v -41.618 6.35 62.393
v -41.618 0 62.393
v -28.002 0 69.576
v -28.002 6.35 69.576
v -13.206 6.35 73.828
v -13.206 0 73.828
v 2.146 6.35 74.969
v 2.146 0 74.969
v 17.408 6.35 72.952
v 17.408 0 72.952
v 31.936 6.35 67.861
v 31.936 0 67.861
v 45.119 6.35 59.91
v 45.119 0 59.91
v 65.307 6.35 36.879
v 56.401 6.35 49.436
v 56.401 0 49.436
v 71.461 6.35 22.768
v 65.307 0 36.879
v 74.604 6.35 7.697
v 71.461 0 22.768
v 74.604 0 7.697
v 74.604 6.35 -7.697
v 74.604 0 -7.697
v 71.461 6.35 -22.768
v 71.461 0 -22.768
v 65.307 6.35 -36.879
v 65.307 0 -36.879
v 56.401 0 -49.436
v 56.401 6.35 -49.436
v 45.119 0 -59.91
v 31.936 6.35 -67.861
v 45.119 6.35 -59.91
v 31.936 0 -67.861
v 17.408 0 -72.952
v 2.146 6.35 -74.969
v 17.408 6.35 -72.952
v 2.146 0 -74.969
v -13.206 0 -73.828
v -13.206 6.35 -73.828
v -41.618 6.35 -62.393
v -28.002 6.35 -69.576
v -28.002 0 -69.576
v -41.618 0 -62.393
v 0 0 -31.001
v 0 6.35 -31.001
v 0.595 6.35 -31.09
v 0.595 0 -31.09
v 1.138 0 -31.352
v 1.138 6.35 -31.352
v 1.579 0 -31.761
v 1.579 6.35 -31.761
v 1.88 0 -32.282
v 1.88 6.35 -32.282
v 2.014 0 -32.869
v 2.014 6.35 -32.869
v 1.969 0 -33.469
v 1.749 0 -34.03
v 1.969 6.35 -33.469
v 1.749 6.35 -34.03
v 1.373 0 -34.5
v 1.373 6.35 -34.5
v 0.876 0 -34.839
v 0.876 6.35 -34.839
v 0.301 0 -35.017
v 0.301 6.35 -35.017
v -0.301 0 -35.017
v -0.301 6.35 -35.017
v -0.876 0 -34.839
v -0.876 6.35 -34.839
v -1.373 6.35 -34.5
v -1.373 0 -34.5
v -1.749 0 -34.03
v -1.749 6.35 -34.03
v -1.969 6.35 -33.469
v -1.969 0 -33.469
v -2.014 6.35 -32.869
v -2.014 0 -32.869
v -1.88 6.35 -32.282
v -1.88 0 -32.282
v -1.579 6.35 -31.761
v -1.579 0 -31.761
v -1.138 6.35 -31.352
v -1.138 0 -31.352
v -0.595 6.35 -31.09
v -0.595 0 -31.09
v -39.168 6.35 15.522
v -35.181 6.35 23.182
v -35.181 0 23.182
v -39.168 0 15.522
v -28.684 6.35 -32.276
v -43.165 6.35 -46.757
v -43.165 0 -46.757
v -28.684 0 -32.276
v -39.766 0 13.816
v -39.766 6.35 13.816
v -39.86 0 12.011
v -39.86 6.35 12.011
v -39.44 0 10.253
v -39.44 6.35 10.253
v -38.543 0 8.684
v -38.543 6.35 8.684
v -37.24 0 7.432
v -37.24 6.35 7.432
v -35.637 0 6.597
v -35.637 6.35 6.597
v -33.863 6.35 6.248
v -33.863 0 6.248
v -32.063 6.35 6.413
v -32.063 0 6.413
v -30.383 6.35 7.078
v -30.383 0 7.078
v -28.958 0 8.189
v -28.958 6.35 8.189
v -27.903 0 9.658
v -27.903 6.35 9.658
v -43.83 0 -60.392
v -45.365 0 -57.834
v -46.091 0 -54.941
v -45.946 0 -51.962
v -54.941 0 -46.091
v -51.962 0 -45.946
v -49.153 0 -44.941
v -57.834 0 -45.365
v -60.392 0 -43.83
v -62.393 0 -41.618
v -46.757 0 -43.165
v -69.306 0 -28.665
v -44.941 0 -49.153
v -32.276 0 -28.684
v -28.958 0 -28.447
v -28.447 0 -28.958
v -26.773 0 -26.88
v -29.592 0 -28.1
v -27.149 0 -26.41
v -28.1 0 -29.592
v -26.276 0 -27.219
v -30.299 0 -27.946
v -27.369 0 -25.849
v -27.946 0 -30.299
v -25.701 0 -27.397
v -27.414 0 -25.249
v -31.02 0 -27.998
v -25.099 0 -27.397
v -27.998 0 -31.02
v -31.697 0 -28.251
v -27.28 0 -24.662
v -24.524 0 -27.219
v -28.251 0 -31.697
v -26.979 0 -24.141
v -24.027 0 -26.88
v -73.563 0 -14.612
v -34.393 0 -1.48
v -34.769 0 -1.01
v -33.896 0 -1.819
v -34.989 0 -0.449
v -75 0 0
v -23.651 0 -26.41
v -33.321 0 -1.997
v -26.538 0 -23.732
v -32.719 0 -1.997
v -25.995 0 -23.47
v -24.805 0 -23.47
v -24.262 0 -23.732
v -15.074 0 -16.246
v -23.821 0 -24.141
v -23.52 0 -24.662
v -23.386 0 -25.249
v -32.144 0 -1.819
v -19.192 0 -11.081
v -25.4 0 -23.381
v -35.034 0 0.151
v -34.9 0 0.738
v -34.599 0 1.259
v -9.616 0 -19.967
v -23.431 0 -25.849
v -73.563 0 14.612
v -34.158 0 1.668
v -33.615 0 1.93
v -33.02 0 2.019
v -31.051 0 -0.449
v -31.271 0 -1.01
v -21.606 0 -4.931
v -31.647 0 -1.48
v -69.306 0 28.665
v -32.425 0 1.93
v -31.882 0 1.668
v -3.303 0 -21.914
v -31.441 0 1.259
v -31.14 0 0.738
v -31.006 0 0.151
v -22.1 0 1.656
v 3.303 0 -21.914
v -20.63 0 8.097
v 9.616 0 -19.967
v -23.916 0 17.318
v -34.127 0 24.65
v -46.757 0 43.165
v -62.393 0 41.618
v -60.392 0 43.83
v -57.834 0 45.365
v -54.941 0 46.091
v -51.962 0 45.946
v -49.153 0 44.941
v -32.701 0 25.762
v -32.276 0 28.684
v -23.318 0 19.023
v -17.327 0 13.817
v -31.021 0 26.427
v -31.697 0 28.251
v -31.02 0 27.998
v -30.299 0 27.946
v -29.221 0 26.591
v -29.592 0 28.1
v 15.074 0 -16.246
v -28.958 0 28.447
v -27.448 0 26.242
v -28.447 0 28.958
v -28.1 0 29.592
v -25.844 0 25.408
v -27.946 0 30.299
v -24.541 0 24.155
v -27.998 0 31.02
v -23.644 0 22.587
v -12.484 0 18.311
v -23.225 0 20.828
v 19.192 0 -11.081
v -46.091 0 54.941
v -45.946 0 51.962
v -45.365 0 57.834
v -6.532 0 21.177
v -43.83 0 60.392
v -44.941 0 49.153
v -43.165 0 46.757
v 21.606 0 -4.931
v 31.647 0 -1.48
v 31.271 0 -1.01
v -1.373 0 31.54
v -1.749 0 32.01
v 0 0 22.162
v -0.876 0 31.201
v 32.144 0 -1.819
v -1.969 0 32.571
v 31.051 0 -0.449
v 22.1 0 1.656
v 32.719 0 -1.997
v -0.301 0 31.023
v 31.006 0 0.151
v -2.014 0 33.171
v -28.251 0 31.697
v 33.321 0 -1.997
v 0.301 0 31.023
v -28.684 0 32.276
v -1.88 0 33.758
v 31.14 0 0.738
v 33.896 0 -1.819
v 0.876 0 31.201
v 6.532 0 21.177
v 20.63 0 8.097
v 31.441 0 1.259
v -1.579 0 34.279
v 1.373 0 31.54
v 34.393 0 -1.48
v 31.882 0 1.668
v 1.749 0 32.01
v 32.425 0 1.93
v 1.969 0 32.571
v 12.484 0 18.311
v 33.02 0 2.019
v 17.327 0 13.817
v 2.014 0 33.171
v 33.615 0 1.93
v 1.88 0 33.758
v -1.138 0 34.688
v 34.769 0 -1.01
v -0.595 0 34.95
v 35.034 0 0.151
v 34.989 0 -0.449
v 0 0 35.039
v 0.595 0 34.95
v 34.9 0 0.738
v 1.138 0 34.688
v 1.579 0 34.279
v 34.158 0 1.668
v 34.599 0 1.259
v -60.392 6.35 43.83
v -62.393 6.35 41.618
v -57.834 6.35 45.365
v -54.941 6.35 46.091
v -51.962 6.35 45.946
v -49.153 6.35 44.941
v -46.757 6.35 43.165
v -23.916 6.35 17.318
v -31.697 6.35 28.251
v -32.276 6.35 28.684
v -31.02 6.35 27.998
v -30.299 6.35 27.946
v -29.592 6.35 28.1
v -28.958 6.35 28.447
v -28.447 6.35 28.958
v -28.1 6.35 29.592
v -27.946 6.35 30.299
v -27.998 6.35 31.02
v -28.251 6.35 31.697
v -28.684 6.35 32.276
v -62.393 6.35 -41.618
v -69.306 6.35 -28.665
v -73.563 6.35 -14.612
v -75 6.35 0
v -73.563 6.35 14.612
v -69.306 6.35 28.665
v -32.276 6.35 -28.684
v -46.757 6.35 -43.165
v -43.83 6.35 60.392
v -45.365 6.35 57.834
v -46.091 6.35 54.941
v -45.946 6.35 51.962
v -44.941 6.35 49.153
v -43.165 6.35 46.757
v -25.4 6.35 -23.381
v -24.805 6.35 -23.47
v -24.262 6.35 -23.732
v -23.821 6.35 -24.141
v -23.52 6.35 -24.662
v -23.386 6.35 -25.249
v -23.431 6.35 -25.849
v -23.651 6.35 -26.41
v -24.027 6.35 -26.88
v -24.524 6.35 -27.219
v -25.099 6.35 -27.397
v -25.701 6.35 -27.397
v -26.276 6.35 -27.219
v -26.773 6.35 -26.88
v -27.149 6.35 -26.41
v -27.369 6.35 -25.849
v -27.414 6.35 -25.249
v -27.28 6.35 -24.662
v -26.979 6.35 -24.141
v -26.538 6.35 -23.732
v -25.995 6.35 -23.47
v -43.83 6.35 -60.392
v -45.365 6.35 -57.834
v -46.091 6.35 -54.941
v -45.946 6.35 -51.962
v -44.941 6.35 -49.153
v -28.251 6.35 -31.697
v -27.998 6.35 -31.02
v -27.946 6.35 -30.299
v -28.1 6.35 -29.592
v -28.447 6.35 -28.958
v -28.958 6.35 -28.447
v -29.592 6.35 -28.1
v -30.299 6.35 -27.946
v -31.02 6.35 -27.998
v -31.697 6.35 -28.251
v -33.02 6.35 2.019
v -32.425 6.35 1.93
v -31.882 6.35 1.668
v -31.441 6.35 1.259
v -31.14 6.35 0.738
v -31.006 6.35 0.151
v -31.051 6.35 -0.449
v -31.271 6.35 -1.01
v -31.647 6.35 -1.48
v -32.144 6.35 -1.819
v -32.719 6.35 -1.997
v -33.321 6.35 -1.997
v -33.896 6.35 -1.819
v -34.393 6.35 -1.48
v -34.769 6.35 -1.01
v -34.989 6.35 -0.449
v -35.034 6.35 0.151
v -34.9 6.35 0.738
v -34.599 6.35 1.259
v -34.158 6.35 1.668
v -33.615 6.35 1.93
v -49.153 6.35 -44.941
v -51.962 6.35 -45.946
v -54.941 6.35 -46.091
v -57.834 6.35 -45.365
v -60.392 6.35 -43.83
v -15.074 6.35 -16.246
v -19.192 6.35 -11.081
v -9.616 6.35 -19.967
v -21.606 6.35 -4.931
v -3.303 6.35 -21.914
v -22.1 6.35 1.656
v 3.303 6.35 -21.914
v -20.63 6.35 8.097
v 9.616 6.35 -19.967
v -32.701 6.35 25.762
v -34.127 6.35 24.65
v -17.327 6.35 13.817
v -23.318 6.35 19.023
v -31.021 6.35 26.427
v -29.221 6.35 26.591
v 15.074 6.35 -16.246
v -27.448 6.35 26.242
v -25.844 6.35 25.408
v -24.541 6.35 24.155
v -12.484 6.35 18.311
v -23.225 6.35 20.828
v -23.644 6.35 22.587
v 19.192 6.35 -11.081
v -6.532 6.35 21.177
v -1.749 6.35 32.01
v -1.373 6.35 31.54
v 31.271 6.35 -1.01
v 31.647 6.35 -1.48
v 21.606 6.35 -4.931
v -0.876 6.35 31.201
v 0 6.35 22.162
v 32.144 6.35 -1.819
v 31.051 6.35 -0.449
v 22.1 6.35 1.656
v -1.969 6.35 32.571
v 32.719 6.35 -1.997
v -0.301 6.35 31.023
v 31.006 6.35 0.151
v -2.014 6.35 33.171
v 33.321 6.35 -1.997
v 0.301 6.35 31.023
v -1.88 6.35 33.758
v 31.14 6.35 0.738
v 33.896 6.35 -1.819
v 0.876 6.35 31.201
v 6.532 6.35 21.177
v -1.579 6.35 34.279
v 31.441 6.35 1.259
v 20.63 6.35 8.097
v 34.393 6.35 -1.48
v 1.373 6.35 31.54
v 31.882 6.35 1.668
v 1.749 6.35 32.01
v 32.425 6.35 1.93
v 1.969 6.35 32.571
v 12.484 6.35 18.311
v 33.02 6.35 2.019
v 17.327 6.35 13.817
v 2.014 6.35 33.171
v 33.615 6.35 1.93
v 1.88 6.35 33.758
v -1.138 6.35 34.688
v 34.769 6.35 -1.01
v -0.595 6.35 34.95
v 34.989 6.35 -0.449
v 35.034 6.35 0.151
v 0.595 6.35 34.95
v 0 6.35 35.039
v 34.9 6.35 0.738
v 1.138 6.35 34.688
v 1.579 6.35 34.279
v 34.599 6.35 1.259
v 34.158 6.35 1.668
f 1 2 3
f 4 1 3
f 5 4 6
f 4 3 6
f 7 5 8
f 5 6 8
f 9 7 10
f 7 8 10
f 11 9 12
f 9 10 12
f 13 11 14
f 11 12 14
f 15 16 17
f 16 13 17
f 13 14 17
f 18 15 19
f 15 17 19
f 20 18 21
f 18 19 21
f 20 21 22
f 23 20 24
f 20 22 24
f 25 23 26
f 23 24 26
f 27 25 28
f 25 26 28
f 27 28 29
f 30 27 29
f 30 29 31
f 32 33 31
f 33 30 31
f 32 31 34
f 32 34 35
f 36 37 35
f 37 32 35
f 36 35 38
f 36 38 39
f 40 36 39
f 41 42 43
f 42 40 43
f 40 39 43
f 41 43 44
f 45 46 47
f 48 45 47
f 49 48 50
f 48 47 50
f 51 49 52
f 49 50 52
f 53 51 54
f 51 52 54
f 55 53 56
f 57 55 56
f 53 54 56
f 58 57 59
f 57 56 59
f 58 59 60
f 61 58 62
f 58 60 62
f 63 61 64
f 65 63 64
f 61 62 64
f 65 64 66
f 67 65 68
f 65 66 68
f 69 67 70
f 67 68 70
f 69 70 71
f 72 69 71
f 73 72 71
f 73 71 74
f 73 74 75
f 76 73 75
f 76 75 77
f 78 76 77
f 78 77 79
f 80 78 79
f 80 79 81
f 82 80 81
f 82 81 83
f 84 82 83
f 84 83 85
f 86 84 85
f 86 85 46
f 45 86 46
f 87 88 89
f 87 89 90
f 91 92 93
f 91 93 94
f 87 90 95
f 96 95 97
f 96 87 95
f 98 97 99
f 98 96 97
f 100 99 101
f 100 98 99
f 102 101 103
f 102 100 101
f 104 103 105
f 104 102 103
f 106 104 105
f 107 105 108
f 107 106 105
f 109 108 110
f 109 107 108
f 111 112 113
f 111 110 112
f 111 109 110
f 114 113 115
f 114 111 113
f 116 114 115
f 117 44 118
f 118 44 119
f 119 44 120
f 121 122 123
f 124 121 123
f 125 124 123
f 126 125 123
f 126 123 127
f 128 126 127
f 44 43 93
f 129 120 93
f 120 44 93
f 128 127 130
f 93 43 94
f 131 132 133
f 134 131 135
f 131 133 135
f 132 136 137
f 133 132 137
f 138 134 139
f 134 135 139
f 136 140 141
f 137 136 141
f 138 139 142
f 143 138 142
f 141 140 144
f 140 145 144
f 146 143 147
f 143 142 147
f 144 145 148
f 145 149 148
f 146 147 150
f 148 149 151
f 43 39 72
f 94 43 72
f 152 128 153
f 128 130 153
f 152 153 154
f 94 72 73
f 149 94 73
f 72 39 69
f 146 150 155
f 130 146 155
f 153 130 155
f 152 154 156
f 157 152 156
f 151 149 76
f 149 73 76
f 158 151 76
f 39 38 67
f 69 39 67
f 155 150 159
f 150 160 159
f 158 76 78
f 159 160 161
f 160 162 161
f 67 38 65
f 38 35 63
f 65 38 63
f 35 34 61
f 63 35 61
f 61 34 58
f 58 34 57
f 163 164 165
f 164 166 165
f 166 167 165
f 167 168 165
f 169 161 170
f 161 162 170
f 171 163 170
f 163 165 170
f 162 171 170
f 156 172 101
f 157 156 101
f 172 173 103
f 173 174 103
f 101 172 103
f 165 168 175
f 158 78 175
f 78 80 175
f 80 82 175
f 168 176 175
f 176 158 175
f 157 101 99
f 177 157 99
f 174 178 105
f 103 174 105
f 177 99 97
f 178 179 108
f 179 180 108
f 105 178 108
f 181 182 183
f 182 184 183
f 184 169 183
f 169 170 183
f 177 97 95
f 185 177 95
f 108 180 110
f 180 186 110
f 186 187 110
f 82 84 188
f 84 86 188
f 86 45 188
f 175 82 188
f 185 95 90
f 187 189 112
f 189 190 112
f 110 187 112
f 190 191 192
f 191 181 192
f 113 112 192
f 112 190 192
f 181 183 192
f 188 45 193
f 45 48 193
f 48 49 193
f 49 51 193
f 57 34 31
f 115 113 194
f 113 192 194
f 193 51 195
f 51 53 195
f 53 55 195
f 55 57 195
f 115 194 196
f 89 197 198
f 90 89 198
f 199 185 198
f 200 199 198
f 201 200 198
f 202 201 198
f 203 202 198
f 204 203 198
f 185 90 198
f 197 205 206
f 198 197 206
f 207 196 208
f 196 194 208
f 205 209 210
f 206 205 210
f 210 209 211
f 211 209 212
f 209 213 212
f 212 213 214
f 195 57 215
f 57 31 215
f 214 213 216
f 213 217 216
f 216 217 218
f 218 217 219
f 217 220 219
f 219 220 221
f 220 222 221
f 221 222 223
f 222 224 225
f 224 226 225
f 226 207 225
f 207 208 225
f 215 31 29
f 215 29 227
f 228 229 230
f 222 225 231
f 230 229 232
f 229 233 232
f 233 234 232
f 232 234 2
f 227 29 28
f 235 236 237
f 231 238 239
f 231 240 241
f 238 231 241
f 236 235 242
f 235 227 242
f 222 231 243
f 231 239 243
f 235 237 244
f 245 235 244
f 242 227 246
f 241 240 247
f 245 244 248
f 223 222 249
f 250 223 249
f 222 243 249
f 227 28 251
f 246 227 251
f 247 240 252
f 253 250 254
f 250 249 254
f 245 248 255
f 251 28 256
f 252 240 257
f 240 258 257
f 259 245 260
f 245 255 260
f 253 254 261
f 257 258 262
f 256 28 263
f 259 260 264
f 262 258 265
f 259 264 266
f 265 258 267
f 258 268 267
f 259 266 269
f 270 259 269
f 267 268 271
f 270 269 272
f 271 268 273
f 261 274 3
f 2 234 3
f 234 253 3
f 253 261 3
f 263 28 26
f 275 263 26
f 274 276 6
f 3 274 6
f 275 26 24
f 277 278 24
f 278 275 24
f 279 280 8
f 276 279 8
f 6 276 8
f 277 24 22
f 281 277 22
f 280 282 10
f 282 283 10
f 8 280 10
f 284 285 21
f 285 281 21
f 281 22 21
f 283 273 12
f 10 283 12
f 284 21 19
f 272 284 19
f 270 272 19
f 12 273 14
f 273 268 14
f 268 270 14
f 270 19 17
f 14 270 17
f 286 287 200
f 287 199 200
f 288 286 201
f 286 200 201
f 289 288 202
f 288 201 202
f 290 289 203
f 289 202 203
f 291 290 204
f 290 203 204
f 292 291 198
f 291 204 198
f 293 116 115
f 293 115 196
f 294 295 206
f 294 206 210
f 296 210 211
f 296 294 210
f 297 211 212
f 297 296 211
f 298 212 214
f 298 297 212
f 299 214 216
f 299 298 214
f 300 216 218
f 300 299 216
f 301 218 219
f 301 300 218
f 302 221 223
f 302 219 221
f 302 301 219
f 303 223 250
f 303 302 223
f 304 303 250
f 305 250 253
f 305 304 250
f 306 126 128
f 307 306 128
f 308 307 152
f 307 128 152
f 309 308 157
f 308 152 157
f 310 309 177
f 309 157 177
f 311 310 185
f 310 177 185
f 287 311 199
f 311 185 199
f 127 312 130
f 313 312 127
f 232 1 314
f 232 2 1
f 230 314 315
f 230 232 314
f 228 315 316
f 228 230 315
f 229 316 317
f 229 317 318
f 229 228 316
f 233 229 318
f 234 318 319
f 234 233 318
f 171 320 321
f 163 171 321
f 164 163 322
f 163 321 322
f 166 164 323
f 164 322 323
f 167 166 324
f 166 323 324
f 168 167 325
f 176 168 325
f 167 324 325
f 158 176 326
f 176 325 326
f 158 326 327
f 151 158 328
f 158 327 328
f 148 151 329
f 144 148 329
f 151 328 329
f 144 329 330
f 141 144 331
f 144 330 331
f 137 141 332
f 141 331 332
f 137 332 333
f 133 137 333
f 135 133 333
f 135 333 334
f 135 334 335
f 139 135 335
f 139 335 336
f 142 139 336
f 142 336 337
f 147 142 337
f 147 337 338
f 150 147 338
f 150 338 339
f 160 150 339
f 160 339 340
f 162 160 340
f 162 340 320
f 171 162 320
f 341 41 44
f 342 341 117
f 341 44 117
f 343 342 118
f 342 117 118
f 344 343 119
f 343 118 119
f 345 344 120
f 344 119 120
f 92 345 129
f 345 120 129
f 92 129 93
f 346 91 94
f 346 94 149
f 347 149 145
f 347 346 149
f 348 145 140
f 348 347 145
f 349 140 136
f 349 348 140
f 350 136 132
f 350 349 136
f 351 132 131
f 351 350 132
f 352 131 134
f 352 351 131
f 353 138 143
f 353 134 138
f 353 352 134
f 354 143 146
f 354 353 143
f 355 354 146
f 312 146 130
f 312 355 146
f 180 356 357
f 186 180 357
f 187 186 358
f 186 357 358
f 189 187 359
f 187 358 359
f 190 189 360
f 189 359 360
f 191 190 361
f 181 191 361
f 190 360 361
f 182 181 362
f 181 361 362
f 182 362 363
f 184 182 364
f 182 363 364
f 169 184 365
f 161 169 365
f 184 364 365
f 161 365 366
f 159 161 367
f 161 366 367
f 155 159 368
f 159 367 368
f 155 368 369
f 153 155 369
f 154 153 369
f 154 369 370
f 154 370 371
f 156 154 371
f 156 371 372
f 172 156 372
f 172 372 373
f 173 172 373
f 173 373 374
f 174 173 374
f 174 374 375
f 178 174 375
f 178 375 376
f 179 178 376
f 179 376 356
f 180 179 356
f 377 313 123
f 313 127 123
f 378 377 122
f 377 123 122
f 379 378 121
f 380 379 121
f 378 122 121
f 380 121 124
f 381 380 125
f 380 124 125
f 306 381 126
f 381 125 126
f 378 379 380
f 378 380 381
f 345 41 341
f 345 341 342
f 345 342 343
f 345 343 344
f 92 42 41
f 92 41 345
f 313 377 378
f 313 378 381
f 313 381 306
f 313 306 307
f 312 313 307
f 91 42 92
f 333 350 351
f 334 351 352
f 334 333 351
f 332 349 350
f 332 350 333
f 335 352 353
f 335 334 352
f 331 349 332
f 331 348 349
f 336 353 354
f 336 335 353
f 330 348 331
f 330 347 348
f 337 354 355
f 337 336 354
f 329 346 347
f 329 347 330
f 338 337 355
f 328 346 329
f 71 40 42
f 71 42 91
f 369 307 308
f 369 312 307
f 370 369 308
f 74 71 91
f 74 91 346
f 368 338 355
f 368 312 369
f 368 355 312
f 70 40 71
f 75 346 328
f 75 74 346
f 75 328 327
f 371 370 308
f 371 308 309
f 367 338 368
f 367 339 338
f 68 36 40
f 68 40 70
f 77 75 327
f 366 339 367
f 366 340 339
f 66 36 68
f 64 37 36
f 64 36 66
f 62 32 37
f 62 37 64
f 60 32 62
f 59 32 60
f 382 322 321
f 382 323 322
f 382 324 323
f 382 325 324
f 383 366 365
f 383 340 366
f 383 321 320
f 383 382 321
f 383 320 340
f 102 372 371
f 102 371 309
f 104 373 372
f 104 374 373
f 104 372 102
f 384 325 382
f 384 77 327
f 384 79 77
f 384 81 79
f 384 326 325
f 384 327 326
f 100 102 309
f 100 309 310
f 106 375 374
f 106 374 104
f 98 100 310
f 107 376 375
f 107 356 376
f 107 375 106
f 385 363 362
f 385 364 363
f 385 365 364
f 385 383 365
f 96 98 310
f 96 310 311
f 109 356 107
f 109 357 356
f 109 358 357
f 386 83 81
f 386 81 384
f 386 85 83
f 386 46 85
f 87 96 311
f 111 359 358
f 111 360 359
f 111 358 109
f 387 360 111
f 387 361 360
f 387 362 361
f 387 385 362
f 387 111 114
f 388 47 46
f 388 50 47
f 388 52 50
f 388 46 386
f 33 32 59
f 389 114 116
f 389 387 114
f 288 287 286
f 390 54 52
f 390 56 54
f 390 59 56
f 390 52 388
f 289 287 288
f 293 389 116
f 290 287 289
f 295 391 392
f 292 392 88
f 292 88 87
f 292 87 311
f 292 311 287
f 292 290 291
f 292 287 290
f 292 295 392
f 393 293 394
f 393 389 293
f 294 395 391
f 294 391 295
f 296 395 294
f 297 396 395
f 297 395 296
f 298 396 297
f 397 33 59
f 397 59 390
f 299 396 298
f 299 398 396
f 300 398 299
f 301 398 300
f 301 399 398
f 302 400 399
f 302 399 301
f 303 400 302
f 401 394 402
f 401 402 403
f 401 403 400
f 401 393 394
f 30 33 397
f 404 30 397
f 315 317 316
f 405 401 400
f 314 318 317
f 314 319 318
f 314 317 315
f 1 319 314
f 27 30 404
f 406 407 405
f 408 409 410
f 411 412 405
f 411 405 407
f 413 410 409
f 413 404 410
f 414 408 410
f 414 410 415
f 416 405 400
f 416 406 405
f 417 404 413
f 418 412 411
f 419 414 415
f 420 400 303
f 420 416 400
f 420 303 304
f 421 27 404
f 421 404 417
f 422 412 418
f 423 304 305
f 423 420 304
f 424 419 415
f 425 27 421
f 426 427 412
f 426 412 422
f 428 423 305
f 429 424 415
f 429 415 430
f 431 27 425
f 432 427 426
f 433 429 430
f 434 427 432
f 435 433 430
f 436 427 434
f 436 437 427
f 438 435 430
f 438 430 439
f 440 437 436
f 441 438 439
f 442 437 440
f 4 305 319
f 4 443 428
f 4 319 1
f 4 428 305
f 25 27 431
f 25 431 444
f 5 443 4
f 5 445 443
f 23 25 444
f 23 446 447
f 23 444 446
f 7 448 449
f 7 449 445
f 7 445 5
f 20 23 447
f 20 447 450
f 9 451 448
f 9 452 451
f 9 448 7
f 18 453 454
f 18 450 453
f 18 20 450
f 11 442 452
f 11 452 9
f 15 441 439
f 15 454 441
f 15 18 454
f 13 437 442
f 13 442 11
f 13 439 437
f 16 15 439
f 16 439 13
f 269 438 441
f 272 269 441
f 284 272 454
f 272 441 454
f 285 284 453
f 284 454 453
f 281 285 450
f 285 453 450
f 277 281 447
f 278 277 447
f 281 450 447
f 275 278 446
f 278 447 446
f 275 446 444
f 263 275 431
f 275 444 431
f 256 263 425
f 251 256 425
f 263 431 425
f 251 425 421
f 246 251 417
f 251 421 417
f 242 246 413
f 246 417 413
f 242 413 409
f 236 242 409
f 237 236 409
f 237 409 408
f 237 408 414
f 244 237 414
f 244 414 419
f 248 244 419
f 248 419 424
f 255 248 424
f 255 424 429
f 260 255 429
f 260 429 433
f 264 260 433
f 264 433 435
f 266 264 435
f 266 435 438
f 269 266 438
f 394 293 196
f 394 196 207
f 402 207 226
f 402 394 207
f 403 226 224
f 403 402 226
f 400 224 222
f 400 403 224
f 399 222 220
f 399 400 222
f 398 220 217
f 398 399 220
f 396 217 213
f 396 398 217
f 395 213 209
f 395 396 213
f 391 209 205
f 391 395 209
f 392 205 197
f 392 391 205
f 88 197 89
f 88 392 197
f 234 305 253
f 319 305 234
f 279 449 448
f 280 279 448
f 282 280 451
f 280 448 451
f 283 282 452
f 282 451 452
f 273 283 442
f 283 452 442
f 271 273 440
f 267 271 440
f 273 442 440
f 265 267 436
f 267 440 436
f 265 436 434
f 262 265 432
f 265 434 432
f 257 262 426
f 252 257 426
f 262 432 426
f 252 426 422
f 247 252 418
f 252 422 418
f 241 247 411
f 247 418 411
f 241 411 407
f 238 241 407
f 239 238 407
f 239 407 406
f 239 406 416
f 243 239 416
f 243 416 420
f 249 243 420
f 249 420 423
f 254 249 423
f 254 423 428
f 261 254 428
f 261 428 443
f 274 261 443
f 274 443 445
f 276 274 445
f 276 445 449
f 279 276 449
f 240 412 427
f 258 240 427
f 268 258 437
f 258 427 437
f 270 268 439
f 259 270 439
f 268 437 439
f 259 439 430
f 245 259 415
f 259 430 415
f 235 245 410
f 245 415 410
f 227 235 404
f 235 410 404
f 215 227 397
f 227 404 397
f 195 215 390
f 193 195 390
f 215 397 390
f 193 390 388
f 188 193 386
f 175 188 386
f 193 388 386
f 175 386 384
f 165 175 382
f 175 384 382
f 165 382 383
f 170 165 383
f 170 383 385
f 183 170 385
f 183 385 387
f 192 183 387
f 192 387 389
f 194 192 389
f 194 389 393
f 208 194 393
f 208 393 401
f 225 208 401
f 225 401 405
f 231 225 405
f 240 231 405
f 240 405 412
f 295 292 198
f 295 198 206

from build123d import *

# Parameters (mm, degrees)
SKETCH1_R           = 75
BOSS_EXTRUDE1_DEPTH = 6.35
SKETCH45_R          = 22.1615
SKETCH45_R_2        = 2.0193
CUT_EXTRUDE36_DEPTH = 107.255929246
FILLET2_R           = 10.16


with BuildPart() as part:
    # Sketch1 → Boss-Extrude1 (new body)
    with BuildSketch(Plane(origin=(0, 0, 0), x_dir=(1, 0, 0), z_dir=(0, 1, 0))):
        with Locations(Location((0, 0, 0), (0, 0, 270))):
            Circle(SKETCH1_R)
    extrude(amount=BOSS_EXTRUDE1_DEPTH)

    # Sketch45 → Cut-Extrude36 (cut, through all)
    with BuildSketch(Plane(origin=(0, 6.35, 0), x_dir=(1, 0, 0), z_dir=(0, 1, 0))):
        with Locations(Location((0, 0, 0), (0, 0, 270))):
            Circle(SKETCH45_R)
        with Locations(Location((-25.4, 25.4, 0), (0, 0, 270))):
            Circle(SKETCH45_R_2)
        with Locations(Location((0, 33.02, 0), (0, 0, 270))):
            Circle(SKETCH45_R_2)
        with Locations(Location((33.02, 0, 0), (0, 0, 270))):
            Circle(SKETCH45_R_2)
        with Locations(Location((0, -33.02, 0), (0, 0, 270))):
            Circle(SKETCH45_R_2)
        with Locations(Location((-33.02, 0, 0), (0, 0, 270))):
            Circle(SKETCH45_R_2)
        with BuildLine():
            Line((-27.903416949, -9.657564215), (-23.915755925, -17.31778977))
            ThreePointArc((-23.915755925, -17.31778977), (-26.616171022, -25.882412255), (-35.180793507, -23.181997158))
            Line((-35.180793507, -23.181997158), (-39.16845453, -15.521771603))
            ThreePointArc((-39.16845453, -15.521771603), (-36.468039434, -6.957149118), (-27.903416949, -9.657564215))
        make_face()
        with BuildLine():
            Line((-28.683948776, -32.276051224), (-51.236957365, -54.829059813))
            ThreePointArc((-51.236957365, -54.829059813), (-54.829059813, -54.829059813), (-54.829059813, -51.236957365))
            Line((-54.829059813, -51.236957365), (-32.276051224, -28.683948776))
            ThreePointArc((-32.276051224, -28.683948776), (-28.683948776, -28.683948776), (-28.683948776, -32.276051224))
        make_face()
        with BuildLine():
            Line((-32.276051224, 28.683948776), (-54.829059813, 51.236957365))
            ThreePointArc((-54.829059813, 51.236957365), (-54.829059813, 54.829059813), (-51.236957365, 54.829059813))
            Line((-51.236957365, 54.829059813), (-28.683948776, 32.276051224))
            ThreePointArc((-28.683948776, 32.276051224), (-28.683948776, 28.683948776), (-32.276051224, 28.683948776))
        make_face()
    extrude(amount=-CUT_EXTRUDE36_DEPTH, mode=Mode.SUBTRACT)

    # Fillet2
    fillet2_edges = [part.edges().sort_by_distance(p)[0] for p in [
        (-51.206535505, 3.175, 54.798637954),
        (-54.798637954, 3.175, 51.206535505),
        (-54.798637954, 3.175, -51.206535505),
        (-51.206535505, 3.175, -54.798637954),
    ]]
    fillet(fillet2_edges, radius=FILLET2_R)


solid = part.part
